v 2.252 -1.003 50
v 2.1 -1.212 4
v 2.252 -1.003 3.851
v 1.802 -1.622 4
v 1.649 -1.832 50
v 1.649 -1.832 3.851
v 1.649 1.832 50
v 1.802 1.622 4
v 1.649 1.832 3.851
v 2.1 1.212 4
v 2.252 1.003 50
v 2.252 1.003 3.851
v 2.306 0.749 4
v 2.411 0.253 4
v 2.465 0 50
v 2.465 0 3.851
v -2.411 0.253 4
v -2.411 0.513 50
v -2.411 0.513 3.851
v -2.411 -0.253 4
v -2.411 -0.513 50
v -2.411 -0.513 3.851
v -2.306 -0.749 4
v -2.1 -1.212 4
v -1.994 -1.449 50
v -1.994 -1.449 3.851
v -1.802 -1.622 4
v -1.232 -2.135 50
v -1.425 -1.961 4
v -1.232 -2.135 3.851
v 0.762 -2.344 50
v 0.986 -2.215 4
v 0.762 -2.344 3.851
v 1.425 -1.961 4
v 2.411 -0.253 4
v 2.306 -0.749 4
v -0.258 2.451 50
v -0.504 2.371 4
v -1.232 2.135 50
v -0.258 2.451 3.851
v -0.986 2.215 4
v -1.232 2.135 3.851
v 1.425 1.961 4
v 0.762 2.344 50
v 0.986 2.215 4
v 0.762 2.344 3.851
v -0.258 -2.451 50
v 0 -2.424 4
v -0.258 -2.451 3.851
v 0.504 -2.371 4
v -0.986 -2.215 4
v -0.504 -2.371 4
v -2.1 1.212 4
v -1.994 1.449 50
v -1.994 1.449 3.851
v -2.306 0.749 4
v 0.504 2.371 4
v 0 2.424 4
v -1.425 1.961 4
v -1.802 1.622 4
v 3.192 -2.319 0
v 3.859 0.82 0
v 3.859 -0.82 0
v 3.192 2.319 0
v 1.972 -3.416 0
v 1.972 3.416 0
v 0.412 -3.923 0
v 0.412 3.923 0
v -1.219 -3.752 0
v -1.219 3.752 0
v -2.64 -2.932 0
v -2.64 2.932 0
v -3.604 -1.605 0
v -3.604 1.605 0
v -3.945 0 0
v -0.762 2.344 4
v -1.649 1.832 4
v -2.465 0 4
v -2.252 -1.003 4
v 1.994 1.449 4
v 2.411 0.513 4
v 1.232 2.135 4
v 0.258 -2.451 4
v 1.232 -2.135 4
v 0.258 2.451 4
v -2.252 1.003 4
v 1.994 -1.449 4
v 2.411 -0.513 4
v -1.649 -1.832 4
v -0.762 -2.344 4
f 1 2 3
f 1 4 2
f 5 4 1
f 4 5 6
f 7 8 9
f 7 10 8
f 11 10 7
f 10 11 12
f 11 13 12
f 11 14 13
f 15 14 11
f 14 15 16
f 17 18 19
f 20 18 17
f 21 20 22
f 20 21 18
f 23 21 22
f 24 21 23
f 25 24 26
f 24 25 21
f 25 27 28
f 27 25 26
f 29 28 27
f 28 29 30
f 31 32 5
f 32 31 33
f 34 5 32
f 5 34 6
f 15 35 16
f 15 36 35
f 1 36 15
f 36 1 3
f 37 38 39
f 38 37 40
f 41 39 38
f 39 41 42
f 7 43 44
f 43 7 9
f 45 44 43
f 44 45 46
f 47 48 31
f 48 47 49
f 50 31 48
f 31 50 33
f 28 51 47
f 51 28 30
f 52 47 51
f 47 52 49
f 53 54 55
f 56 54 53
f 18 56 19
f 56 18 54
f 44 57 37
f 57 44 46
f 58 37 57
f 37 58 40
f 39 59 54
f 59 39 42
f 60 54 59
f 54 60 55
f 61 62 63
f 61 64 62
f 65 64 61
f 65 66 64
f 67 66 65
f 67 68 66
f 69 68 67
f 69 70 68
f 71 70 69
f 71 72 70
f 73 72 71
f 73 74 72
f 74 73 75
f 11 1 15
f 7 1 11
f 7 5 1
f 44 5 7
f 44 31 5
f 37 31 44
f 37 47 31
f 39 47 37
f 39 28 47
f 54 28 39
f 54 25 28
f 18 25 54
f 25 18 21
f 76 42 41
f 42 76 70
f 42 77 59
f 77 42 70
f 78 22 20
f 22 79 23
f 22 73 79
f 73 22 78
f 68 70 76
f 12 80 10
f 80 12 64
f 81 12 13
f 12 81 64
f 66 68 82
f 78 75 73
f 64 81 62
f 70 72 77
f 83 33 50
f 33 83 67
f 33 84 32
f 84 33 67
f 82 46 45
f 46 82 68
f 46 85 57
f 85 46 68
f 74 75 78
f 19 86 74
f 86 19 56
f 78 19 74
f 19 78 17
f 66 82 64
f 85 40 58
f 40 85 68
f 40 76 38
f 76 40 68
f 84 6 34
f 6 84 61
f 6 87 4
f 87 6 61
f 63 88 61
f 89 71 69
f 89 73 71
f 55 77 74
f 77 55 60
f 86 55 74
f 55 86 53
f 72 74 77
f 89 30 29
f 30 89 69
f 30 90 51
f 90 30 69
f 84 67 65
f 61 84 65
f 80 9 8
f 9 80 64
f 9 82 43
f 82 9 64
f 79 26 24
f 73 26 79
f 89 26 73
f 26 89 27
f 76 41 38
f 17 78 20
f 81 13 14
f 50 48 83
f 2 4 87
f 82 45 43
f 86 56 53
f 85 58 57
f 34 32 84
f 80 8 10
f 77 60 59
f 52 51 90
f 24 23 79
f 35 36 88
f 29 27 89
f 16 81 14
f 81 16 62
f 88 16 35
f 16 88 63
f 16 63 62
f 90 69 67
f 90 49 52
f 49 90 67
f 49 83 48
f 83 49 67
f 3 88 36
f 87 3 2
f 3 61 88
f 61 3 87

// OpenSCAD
$fn=15;

// 8-32 x 2in machine screw
// Phillips oval head
module 8_32_2_machine_screw() {
  shaftDiameter = 4.93;
  screwLength = 50;
  headLength = 4;
  headWidth = 7.89;
  
  union() {
  cylinder(h=screwLength, r=shaftDiameter/2);
  rotate_extrude()
  polygon([
    [0, 0],
    [headWidth/2, 0],
    [shaftDiameter/2, headLength],
    [0, headLength]
  ]);
  }
}
8_32_2_machine_screw();
